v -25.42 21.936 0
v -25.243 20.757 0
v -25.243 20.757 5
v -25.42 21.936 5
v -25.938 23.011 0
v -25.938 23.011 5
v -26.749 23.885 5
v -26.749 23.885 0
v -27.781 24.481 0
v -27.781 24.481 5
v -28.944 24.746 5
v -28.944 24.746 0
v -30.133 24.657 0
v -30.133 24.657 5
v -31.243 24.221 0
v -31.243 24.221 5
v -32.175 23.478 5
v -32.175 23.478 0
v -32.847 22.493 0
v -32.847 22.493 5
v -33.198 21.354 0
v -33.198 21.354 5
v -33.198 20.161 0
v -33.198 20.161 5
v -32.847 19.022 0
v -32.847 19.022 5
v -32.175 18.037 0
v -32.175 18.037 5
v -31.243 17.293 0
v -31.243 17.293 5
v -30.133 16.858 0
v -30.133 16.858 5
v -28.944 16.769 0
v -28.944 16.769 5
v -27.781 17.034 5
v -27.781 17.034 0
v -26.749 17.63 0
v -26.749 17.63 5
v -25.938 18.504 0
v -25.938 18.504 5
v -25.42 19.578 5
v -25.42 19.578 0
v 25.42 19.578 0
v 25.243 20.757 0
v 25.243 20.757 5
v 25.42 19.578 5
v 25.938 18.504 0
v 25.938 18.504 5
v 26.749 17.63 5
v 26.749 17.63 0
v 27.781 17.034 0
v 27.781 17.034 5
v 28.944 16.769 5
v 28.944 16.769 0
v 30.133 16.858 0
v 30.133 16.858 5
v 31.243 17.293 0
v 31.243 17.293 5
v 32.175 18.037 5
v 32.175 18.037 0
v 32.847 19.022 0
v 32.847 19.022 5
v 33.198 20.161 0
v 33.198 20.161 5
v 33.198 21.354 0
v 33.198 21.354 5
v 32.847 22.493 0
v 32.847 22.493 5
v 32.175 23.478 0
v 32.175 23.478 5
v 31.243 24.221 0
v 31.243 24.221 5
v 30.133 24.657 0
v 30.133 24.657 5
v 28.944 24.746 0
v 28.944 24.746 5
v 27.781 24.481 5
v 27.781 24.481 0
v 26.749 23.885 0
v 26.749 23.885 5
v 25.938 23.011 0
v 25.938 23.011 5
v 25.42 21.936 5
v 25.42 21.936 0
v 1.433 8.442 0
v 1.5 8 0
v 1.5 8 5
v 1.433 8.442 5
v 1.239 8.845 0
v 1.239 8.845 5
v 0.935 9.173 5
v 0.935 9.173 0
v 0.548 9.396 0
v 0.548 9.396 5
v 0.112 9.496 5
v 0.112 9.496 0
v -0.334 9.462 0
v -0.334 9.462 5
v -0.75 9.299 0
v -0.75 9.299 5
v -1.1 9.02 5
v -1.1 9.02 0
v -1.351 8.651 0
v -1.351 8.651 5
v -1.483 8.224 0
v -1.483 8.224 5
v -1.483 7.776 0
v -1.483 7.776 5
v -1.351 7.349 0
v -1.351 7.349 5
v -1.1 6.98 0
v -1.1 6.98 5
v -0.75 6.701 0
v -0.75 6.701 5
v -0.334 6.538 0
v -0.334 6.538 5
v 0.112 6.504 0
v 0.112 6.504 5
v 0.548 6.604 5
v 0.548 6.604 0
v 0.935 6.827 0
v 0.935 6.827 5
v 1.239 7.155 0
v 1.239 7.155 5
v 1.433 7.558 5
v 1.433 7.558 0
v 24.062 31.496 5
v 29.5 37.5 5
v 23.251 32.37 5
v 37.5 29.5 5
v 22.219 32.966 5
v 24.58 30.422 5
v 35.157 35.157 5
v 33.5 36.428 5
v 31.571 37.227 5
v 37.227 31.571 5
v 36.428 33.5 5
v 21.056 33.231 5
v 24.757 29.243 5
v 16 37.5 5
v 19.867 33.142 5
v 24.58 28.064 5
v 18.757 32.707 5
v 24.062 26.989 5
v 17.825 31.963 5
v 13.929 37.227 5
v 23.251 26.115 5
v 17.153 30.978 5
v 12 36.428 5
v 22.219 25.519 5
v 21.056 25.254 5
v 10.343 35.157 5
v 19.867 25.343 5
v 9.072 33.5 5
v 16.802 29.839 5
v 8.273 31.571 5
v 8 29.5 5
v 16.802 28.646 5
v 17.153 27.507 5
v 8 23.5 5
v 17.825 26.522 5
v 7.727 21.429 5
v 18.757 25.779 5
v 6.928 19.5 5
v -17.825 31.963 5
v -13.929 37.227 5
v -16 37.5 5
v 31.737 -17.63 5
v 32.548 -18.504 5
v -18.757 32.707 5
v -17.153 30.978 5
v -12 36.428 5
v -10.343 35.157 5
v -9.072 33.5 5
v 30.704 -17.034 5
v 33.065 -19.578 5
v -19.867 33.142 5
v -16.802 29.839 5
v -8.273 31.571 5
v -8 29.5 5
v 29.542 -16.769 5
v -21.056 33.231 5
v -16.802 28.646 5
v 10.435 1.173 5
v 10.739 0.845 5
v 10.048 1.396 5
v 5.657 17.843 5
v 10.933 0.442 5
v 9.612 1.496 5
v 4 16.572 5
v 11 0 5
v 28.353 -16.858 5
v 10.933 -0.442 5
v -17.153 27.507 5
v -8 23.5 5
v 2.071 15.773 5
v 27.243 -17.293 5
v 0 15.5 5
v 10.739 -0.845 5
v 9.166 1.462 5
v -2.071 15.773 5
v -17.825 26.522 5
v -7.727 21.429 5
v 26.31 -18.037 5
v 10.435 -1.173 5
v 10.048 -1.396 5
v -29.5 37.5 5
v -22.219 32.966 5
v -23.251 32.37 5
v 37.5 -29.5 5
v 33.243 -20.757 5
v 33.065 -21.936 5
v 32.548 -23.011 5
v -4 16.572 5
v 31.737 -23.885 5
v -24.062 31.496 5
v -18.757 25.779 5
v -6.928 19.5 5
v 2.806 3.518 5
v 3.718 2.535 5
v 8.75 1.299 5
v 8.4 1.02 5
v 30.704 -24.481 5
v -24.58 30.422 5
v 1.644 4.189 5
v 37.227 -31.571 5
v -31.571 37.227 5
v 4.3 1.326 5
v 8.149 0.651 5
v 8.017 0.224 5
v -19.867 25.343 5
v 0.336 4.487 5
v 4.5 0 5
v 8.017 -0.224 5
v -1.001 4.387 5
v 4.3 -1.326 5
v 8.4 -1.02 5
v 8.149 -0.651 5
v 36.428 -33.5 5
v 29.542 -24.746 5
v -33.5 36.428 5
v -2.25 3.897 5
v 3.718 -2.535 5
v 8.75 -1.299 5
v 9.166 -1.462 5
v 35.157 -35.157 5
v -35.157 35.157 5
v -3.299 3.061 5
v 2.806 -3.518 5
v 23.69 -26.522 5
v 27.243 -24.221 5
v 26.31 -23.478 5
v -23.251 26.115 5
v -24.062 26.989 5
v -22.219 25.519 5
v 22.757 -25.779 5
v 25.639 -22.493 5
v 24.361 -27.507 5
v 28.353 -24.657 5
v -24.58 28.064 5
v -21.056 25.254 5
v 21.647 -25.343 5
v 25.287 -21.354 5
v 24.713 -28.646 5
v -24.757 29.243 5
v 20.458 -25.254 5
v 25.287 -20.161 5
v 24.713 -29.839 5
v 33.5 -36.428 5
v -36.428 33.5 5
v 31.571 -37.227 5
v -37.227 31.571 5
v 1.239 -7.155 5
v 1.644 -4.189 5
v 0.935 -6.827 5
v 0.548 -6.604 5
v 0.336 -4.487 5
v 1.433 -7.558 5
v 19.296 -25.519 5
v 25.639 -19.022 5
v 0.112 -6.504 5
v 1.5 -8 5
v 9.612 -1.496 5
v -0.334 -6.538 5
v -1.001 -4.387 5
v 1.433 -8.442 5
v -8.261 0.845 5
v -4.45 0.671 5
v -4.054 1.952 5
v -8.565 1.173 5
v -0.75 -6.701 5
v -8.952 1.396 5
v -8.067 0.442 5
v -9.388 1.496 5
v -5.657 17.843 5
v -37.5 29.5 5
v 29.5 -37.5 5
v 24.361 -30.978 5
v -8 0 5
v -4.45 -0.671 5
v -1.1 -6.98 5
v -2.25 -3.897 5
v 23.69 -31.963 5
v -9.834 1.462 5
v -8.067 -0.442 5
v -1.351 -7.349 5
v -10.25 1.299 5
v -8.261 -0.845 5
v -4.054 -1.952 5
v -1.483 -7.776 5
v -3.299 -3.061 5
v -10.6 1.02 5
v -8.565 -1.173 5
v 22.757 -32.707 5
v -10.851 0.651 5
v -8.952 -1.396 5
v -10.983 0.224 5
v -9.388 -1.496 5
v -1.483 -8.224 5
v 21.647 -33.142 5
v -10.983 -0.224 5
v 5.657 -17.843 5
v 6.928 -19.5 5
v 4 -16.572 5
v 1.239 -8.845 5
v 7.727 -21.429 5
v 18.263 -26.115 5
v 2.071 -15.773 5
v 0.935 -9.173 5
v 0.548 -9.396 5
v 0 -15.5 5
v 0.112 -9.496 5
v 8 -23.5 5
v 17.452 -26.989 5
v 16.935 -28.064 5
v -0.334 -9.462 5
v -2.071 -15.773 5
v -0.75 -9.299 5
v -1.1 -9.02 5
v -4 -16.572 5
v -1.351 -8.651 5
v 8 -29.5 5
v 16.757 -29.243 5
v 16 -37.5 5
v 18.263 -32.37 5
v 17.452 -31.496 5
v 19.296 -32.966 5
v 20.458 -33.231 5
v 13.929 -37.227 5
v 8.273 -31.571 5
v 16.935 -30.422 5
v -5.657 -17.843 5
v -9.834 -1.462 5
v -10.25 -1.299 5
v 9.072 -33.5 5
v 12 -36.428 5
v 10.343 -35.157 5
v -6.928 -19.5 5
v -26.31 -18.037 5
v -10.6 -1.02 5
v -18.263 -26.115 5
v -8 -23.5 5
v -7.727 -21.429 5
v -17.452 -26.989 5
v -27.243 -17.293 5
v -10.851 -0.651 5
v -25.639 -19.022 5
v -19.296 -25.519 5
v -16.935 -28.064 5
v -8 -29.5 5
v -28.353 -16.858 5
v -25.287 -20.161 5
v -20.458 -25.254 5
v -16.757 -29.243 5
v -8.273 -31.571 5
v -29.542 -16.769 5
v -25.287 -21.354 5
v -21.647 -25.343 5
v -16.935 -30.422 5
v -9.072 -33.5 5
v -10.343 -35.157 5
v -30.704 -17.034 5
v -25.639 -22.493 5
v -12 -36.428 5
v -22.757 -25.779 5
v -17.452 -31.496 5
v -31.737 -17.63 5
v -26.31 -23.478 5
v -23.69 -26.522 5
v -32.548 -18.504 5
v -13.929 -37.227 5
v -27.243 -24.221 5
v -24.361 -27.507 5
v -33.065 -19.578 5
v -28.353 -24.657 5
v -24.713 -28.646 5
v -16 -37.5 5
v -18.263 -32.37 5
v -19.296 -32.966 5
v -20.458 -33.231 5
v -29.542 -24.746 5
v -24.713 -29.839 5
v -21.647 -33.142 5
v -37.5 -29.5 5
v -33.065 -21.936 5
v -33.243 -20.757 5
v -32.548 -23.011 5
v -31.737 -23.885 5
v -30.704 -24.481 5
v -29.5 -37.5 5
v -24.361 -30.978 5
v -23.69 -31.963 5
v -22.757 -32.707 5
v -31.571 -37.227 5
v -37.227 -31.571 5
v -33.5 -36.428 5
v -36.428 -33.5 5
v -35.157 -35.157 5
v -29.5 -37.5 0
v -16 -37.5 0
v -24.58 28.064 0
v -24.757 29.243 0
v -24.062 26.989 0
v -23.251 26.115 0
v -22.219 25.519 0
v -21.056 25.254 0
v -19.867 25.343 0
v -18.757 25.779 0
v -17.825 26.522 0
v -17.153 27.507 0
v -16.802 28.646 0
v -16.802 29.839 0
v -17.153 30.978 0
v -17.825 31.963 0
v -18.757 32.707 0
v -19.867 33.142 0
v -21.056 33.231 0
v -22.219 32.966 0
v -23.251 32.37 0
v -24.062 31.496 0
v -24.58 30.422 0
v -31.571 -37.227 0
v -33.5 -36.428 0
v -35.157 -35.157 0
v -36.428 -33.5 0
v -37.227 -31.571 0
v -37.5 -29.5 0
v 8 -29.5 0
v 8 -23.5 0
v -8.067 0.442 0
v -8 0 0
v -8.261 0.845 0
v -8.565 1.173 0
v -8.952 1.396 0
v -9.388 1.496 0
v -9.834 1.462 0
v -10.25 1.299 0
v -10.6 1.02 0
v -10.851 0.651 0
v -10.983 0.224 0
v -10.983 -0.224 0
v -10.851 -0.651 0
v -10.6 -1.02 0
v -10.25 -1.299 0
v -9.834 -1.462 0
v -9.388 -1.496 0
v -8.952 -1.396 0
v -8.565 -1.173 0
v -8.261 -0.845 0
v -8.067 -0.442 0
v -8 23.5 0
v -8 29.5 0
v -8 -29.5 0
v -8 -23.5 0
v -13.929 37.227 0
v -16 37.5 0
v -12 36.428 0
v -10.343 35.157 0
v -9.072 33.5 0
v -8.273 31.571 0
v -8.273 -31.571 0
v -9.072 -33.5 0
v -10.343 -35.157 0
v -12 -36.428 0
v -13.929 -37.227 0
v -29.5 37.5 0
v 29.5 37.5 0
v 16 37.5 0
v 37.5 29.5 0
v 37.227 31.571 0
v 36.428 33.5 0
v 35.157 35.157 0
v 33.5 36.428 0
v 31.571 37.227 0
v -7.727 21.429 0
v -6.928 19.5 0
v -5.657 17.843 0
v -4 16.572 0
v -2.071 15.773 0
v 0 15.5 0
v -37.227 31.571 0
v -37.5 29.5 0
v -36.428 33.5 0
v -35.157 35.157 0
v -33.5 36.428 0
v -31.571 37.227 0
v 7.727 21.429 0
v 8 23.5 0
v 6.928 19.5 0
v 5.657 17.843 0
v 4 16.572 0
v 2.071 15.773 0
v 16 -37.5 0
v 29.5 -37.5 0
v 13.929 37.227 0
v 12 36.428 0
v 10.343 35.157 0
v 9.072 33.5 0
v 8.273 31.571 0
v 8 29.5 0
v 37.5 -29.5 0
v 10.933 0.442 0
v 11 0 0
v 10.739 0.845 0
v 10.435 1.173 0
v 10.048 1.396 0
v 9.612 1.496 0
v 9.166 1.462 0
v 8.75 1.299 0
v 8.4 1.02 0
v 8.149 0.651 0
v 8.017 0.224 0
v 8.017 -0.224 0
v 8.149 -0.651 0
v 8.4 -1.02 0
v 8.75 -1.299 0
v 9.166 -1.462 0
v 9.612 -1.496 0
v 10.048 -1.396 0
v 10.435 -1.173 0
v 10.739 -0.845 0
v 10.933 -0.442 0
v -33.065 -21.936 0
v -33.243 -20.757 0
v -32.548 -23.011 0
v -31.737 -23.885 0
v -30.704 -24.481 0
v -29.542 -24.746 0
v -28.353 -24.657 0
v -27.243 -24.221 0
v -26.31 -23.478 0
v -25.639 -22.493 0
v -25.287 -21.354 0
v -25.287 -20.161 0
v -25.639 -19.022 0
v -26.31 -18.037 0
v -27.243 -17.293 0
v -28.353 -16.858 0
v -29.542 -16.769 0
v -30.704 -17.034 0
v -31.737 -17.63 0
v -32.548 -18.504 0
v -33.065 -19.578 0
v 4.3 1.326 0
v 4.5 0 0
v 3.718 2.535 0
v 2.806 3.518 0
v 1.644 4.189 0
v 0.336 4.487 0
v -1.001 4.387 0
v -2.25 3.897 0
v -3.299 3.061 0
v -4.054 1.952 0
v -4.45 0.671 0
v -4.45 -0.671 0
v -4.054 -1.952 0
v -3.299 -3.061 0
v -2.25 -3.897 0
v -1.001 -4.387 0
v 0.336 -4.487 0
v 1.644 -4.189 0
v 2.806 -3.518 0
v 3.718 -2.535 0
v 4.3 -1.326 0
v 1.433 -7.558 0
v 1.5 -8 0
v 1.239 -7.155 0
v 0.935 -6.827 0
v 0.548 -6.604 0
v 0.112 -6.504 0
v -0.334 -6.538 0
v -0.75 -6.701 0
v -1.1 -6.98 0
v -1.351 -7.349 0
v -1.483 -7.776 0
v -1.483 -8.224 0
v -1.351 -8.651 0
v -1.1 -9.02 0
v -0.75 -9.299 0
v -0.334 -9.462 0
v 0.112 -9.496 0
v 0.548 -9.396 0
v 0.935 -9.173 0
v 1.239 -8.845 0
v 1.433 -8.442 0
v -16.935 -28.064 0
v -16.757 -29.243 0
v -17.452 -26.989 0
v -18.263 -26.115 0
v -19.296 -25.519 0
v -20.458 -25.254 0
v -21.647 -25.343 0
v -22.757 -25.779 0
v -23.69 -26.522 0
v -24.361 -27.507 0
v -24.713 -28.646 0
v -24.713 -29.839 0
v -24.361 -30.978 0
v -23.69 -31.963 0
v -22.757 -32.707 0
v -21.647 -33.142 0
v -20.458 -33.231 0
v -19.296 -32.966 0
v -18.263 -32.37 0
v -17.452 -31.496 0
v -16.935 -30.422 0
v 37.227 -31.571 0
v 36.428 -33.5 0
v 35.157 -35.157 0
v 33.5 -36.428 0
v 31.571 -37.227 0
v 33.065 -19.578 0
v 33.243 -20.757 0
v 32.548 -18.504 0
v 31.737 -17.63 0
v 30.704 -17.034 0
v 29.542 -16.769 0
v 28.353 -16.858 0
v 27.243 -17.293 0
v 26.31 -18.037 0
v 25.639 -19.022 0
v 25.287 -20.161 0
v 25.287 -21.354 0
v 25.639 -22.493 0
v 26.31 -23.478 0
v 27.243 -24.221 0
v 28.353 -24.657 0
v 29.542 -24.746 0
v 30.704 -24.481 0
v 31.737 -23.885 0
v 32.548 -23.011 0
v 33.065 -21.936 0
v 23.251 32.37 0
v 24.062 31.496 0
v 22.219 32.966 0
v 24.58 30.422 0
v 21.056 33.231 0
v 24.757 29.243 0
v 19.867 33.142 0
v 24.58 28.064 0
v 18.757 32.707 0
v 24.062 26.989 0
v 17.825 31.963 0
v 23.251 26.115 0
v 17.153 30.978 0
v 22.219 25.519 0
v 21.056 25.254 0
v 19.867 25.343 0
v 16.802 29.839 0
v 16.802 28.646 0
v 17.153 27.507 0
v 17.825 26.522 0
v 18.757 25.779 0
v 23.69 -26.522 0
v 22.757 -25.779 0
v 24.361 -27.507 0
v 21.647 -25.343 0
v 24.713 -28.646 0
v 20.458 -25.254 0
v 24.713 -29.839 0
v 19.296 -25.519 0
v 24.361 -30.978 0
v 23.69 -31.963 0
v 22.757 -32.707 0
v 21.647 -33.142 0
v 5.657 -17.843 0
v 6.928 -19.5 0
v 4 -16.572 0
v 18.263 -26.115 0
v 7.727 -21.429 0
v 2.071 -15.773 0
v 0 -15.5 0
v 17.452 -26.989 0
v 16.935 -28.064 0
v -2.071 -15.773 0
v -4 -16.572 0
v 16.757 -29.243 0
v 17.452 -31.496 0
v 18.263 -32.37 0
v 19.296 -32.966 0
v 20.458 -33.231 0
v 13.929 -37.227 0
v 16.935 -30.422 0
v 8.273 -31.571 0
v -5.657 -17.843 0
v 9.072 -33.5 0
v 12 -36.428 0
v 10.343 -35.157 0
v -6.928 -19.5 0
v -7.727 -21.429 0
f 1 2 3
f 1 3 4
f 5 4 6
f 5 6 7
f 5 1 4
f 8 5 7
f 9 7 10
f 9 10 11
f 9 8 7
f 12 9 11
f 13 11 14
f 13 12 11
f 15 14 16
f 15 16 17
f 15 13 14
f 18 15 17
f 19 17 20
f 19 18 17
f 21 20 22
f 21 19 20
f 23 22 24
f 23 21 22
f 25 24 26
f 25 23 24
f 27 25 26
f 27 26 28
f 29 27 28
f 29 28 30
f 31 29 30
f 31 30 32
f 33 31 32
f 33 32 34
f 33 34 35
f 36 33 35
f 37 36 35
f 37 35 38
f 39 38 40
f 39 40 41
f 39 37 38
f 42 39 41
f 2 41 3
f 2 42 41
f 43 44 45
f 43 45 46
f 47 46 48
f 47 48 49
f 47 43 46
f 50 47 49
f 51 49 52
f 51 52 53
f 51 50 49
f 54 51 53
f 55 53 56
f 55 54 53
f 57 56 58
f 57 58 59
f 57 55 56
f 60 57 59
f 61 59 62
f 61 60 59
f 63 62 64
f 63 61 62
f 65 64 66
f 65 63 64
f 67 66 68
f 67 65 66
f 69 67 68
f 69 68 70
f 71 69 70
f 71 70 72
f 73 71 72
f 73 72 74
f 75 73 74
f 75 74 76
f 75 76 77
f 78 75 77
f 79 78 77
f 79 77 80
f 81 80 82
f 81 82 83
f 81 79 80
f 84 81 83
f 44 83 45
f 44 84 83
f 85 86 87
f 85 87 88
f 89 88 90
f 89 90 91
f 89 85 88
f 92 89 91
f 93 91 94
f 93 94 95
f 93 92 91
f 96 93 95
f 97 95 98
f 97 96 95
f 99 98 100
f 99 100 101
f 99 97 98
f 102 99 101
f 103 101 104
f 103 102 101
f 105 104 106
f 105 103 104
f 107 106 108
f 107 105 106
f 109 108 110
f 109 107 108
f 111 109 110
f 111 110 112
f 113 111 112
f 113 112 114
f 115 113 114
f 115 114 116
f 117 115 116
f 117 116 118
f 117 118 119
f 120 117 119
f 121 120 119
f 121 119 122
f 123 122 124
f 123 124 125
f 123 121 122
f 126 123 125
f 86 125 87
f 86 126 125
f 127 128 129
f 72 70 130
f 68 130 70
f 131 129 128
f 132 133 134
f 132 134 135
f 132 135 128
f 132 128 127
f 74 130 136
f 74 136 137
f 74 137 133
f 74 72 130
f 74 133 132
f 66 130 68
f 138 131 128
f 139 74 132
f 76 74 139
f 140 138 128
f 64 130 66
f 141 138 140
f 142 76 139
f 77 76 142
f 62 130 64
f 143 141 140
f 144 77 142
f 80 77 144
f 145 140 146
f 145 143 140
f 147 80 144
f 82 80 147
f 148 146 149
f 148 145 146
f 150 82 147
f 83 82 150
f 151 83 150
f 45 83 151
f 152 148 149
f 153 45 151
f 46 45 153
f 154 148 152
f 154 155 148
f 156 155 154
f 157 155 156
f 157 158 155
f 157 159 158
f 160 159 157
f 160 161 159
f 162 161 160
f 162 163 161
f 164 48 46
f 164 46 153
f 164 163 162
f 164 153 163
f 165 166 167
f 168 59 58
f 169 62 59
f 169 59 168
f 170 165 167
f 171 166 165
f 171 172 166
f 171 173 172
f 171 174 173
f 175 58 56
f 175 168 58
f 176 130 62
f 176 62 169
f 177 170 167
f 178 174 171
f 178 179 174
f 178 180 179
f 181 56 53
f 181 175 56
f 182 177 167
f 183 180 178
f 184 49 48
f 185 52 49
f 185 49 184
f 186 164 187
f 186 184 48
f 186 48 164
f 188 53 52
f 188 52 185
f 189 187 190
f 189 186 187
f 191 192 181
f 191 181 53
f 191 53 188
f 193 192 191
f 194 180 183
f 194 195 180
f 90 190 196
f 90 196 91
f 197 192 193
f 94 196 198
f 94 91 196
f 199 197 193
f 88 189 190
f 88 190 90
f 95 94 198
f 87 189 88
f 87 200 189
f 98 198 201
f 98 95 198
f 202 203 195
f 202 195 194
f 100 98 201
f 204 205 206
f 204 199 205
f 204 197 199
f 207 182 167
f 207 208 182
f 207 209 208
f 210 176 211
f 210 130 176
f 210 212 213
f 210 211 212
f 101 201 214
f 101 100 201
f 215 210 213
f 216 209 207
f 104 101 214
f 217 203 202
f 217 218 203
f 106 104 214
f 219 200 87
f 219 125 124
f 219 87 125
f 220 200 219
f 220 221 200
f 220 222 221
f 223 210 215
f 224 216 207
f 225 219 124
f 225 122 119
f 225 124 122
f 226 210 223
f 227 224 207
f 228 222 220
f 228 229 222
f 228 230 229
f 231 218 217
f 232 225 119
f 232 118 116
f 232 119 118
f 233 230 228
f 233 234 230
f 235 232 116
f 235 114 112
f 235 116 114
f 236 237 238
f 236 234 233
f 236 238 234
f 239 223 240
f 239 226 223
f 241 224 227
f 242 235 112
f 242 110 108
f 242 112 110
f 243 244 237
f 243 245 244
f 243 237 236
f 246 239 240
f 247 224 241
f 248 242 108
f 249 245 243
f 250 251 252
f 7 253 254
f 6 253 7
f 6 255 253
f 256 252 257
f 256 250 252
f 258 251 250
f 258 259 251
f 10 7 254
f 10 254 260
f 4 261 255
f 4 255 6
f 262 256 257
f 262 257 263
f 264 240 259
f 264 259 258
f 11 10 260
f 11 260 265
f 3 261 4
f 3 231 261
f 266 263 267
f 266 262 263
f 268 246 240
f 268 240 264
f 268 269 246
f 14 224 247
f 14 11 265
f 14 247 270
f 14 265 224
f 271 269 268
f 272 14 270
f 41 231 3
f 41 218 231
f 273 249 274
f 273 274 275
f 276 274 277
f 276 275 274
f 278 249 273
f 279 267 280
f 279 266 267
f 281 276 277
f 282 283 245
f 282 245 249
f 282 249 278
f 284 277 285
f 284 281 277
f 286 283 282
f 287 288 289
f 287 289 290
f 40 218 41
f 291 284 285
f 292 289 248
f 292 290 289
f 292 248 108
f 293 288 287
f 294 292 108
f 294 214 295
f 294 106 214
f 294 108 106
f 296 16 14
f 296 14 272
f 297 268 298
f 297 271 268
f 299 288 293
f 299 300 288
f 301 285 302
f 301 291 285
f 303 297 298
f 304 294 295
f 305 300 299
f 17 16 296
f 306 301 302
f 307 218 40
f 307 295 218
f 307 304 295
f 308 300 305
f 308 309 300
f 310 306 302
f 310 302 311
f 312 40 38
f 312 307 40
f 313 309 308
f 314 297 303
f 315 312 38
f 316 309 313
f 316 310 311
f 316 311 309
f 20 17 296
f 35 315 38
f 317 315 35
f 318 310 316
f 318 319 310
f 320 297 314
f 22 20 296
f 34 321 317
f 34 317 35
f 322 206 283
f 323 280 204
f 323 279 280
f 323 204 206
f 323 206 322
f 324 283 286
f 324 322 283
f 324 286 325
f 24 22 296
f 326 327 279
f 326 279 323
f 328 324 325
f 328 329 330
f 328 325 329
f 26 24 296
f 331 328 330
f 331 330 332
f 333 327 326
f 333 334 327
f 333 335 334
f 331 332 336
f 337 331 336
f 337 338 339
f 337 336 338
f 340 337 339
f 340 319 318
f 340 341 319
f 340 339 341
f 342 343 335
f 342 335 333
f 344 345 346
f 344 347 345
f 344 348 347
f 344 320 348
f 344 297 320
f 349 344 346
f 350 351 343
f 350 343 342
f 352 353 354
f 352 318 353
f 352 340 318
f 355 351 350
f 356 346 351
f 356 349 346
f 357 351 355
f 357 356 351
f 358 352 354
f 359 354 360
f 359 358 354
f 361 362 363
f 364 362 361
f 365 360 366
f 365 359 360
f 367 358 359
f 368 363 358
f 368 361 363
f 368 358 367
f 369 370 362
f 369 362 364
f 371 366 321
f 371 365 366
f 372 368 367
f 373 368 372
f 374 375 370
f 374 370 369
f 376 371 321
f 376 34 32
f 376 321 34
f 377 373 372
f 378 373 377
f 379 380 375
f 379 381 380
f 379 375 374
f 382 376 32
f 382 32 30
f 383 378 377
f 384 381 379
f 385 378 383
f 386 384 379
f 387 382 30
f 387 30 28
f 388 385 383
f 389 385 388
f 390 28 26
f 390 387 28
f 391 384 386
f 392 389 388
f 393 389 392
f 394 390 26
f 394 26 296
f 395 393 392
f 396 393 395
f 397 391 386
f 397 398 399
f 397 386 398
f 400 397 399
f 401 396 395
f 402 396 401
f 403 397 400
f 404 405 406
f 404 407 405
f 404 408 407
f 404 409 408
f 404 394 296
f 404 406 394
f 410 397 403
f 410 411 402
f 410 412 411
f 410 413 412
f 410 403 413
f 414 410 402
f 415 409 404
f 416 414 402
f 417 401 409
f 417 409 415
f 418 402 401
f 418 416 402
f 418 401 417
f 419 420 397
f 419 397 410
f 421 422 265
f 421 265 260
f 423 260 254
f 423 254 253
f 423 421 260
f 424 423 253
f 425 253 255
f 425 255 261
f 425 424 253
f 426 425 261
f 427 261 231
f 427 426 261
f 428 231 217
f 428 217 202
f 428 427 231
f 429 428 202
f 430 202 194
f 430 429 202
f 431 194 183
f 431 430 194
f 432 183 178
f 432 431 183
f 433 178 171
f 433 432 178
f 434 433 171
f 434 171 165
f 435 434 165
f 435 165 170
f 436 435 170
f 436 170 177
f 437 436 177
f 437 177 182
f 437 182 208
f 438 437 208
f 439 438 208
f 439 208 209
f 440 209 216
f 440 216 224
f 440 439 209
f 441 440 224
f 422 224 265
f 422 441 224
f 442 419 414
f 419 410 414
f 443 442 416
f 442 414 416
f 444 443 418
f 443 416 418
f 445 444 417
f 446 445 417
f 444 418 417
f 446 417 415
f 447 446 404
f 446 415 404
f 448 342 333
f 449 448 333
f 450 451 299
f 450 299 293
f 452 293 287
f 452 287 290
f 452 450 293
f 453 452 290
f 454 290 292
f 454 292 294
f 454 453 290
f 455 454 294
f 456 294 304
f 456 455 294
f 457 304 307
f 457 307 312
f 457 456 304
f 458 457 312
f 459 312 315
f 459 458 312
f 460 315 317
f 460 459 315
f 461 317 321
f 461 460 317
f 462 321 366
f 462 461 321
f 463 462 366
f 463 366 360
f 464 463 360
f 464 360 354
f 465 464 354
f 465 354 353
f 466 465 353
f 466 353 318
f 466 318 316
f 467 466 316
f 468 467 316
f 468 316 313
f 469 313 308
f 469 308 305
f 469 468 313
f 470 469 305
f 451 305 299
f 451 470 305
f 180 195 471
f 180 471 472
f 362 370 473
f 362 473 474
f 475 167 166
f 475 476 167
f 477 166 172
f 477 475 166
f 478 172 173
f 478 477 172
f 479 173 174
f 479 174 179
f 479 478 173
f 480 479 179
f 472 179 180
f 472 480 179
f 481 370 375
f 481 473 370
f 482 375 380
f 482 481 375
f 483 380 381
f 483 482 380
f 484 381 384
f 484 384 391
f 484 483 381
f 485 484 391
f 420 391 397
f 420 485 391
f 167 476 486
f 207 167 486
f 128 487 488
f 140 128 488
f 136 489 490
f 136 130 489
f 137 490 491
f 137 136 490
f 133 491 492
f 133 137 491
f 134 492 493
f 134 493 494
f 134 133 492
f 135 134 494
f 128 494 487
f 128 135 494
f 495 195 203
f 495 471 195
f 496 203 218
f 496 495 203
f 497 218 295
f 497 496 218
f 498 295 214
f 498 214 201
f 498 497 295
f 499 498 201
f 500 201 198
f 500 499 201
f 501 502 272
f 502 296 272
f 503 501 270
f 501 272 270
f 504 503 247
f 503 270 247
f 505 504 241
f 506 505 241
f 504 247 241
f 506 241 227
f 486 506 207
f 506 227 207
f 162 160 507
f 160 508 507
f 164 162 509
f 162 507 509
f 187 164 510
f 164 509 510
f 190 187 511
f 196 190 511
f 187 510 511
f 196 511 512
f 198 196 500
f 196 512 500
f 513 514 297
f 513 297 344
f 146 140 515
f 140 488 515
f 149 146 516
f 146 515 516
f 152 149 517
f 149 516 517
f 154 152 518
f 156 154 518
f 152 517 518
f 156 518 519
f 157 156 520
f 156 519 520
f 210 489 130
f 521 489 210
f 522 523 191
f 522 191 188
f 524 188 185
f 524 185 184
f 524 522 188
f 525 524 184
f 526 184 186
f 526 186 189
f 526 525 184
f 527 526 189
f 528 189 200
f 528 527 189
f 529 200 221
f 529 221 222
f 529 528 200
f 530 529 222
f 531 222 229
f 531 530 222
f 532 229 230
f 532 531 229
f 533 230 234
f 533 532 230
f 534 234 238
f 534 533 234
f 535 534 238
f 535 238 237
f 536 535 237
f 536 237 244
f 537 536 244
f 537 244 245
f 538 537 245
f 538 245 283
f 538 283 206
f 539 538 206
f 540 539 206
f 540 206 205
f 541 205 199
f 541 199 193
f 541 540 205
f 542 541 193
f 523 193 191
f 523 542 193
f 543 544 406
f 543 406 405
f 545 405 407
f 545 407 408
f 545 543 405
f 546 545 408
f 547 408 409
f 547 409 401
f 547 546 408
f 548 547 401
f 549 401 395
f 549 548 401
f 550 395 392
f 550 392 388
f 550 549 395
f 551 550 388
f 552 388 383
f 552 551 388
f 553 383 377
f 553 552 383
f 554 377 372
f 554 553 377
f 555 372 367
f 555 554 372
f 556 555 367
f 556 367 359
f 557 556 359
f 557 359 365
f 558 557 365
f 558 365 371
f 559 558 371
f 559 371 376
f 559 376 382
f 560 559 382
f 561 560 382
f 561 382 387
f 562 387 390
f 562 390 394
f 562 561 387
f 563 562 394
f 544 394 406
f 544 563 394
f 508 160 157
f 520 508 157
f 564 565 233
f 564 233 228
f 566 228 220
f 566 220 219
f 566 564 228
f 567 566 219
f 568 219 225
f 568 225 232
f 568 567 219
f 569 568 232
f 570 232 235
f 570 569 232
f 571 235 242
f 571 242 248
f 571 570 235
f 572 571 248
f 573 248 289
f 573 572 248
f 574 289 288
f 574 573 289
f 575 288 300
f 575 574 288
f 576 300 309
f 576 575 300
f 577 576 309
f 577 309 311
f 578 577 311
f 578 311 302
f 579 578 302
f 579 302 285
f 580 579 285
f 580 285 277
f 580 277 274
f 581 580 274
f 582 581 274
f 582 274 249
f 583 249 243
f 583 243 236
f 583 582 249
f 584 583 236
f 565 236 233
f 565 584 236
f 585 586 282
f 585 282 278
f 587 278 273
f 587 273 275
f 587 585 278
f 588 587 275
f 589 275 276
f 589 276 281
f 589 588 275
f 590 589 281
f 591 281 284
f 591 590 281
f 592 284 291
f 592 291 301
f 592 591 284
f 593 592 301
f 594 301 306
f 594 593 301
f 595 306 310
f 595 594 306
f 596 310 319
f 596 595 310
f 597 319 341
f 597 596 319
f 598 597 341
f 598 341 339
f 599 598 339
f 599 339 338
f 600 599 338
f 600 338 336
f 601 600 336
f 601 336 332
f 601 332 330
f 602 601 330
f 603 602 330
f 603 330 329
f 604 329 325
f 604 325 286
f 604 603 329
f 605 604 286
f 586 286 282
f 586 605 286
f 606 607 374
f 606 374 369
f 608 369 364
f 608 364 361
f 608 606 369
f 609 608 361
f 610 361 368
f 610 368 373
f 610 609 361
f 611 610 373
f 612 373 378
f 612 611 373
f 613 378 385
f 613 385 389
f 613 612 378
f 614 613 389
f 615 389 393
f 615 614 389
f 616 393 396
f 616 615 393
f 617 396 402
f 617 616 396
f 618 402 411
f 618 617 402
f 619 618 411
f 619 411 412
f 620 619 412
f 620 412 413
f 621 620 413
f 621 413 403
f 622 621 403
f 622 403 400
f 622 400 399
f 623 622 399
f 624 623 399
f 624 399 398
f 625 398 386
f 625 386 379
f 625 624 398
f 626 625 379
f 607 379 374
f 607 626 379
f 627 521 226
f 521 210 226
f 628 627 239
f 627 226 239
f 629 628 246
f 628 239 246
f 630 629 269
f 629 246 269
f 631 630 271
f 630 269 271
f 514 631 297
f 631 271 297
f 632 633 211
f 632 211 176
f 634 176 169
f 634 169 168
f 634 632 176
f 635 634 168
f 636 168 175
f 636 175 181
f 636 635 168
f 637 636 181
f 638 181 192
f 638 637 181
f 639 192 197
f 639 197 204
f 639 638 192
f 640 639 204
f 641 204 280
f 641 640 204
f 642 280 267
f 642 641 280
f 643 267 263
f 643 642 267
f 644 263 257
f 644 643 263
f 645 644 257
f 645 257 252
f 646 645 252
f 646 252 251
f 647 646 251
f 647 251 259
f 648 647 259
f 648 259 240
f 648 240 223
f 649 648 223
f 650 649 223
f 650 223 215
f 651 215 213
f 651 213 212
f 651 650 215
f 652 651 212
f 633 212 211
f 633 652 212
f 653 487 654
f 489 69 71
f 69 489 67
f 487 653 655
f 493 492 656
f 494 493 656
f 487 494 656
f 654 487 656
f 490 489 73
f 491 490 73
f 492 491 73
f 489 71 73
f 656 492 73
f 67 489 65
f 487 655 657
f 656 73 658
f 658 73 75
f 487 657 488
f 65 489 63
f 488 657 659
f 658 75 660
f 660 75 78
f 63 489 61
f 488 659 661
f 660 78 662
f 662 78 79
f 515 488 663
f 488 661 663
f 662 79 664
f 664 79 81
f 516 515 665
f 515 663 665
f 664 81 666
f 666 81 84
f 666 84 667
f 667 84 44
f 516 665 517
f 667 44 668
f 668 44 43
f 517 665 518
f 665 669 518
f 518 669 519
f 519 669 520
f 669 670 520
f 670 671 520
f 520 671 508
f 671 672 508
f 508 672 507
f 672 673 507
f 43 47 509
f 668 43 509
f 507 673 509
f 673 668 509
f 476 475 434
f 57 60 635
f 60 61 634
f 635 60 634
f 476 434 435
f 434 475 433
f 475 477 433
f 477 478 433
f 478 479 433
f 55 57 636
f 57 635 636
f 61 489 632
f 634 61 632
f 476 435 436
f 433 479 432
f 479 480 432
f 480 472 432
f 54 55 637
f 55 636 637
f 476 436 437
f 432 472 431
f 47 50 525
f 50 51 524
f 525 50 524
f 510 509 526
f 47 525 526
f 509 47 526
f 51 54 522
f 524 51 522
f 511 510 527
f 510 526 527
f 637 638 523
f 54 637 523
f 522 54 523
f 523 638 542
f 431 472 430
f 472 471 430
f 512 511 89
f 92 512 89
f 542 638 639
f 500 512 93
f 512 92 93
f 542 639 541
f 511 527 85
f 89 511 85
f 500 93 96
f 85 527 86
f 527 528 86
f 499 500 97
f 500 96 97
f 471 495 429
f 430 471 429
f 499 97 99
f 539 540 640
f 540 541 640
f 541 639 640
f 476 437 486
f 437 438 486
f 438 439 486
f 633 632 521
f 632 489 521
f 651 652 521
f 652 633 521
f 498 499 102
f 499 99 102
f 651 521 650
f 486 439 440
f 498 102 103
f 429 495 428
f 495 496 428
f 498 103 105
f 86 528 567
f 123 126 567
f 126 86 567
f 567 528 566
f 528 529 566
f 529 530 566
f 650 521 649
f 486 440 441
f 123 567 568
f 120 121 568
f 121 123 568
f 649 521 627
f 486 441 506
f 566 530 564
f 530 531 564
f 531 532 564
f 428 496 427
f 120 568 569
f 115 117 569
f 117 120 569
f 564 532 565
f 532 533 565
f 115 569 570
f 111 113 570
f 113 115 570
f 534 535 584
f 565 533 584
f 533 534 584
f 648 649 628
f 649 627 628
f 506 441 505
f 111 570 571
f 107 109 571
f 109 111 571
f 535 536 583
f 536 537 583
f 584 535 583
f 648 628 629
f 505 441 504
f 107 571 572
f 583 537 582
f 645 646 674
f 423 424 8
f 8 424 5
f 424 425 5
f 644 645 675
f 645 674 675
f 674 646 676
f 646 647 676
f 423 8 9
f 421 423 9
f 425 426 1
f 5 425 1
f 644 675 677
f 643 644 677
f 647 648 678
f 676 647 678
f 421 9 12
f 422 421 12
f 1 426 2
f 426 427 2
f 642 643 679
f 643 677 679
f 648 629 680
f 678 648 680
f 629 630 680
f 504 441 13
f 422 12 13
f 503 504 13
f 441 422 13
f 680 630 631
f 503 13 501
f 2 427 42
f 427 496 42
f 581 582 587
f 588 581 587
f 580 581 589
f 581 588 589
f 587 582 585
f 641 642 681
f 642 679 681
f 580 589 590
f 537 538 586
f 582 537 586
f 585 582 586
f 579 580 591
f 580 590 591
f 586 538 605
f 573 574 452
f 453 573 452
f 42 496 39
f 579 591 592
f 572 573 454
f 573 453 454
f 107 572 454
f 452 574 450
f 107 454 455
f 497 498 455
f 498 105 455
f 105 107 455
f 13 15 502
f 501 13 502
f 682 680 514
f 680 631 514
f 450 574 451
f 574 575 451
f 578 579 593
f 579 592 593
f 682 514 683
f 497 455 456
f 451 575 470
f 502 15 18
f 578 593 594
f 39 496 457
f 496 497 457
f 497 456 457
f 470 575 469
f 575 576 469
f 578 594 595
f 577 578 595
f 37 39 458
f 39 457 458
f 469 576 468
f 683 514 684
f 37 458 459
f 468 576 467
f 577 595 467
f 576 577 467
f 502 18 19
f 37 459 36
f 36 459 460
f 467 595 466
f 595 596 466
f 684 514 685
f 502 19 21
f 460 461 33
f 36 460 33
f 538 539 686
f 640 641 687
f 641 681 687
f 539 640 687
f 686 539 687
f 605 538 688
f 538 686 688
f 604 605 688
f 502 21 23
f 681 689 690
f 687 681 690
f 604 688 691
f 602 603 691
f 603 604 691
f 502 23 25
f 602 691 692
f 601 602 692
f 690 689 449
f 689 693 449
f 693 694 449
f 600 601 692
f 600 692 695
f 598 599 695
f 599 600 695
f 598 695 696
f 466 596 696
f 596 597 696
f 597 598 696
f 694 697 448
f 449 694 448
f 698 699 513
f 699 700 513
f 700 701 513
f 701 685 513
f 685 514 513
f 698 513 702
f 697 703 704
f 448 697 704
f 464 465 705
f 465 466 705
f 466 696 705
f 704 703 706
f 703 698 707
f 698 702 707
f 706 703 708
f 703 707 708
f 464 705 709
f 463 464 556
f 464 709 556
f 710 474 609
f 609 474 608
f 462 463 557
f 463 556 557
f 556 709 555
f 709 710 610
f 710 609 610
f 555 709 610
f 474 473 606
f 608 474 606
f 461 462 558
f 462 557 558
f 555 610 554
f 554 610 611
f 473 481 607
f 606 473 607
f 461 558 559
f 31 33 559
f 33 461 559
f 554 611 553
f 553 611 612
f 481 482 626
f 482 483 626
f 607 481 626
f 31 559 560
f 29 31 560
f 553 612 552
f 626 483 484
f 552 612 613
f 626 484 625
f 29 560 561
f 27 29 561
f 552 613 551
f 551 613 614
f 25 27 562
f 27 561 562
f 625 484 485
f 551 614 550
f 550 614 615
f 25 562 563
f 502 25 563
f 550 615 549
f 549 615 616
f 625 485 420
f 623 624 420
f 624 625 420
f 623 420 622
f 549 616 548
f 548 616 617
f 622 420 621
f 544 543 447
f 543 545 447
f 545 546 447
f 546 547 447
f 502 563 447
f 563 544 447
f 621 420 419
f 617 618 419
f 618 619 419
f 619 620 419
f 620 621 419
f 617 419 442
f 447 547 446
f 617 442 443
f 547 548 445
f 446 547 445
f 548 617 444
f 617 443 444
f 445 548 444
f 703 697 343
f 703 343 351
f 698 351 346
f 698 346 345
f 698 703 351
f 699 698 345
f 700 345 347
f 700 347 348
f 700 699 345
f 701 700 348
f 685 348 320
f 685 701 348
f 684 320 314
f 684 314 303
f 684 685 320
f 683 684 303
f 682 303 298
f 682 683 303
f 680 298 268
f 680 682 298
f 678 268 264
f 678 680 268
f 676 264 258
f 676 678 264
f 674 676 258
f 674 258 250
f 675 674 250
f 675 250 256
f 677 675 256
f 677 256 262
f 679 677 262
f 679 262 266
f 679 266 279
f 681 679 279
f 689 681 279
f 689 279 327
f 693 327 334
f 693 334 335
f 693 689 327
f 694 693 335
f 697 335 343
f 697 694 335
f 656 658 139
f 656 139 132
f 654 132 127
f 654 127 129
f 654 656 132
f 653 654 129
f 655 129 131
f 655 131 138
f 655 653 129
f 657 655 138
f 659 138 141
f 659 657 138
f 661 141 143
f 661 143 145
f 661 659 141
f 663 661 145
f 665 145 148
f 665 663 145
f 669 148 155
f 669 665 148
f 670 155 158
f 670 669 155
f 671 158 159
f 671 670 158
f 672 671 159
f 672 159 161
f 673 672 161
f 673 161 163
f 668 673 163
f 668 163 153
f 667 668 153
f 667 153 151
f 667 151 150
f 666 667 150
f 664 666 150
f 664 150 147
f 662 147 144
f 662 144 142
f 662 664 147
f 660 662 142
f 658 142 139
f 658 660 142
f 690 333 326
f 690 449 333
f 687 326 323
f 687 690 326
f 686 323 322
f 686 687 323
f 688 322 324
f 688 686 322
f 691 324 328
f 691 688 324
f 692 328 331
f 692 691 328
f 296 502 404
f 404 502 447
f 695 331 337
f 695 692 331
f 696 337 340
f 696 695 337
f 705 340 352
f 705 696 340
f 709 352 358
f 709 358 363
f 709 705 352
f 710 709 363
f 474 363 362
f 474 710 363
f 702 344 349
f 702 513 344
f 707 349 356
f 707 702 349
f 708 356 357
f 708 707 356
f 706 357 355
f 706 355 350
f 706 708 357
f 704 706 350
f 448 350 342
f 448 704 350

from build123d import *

# Parameters (mm, degrees)
SKETCH1_W           = 75
SKETCH1_H           = 75
SKETCH1_R           = 1.5
SKETCH1_R_2         = 4.5
SKETCH1_R_3         = 4
BOSS_EXTRUDE1_DEPTH = 5
SKETCH3_W           = 16
SKETCH3_H           = 22
CUT_EXTRUDE1_DEPTH  = 5
FILLET1_R           = 8


with BuildPart() as part:
    # Sketch1 → Boss-Extrude1 (new body)
    with BuildSketch(Plane(origin=(0, 0, 0), x_dir=(-1, 0, 0), z_dir=(0, 0, 1))):
        Rectangle(SKETCH1_W, SKETCH1_H)
        with Locations(Location((9.5, 0, 0), (0, 0, 180))):
            Circle(SKETCH1_R, mode=Mode.SUBTRACT)
        with Locations(Location((-9.5, 0, 0), (0, 0, 180))):
            Circle(SKETCH1_R, mode=Mode.SUBTRACT)
        with Locations(Location((0, -8, 0), (0, 0, 180))):
            Circle(SKETCH1_R, mode=Mode.SUBTRACT)
        with Locations(Location((0, 8, 0), (0, 0, 180))):
            Circle(SKETCH1_R, mode=Mode.SUBTRACT)
        with Locations(Location((0, 0, 0), (0, 0, 180))):
            Circle(SKETCH1_R_2, mode=Mode.SUBTRACT)
        with Locations(Location((20.757359313, 29.242640687, 0), (0, 0, 180))):
            Circle(SKETCH1_R_3, mode=Mode.SUBTRACT)
        with Locations((29.242640687, 20.757359313)):
            Circle(SKETCH1_R_3, mode=Mode.SUBTRACT)
        with Locations((-29.242640687, -20.757359313)):
            Circle(SKETCH1_R_3, mode=Mode.SUBTRACT)
        with Locations(Location((-20.757359313, -29.242640687, 0), (0, 0, 180))):
            Circle(SKETCH1_R_3, mode=Mode.SUBTRACT)
        with Locations((20.757359313, -29.242640687)):
            Circle(SKETCH1_R_3, mode=Mode.SUBTRACT)
        with Locations(Location((29.242640687, -20.757359313, 0), (0, 0, 180))):
            Circle(SKETCH1_R_3, mode=Mode.SUBTRACT)
        with Locations((-20.757359313, 29.242640687)):
            Circle(SKETCH1_R_3, mode=Mode.SUBTRACT)
        with Locations(Location((-29.242640687, 20.757359313, 0), (0, 0, 180))):
            Circle(SKETCH1_R_3, mode=Mode.SUBTRACT)
    extrude(amount=BOSS_EXTRUDE1_DEPTH)

    # Sketch3 → Cut-Extrude1 (cut)
    with BuildSketch(Plane.XY.offset(5)):
        with Locations((0, 26.5)):
            Rectangle(SKETCH3_W, SKETCH3_H)
        with Locations((0, -26.5)):
            Rectangle(SKETCH3_W, SKETCH3_H)
    extrude(amount=-CUT_EXTRUDE1_DEPTH, mode=Mode.SUBTRACT)

    # Fillet1
    fillet1_edges = [part.edges().sort_by_distance(p)[0] for p in [
        (-37.5, -37.5, 2.5),
        (-8, -37.5, 2.5),
        (8, -15.5, 2.5),
        (-8, -15.5, 2.5),
        (8, -37.5, 2.5),
        (37.5, -37.5, 2.5),
        (37.5, 37.5, 2.5),
        (8, 37.5, 2.5),
        (8, 15.5, 2.5),
        (-8, 15.5, 2.5),
        (-8, 37.5, 2.5),
        (-37.5, 37.5, 2.5),
    ]]
    fillet(fillet1_edges, radius=FILLET1_R - 0.0001)  # a hair under: the kernel refuses the full size


solid = part.part
